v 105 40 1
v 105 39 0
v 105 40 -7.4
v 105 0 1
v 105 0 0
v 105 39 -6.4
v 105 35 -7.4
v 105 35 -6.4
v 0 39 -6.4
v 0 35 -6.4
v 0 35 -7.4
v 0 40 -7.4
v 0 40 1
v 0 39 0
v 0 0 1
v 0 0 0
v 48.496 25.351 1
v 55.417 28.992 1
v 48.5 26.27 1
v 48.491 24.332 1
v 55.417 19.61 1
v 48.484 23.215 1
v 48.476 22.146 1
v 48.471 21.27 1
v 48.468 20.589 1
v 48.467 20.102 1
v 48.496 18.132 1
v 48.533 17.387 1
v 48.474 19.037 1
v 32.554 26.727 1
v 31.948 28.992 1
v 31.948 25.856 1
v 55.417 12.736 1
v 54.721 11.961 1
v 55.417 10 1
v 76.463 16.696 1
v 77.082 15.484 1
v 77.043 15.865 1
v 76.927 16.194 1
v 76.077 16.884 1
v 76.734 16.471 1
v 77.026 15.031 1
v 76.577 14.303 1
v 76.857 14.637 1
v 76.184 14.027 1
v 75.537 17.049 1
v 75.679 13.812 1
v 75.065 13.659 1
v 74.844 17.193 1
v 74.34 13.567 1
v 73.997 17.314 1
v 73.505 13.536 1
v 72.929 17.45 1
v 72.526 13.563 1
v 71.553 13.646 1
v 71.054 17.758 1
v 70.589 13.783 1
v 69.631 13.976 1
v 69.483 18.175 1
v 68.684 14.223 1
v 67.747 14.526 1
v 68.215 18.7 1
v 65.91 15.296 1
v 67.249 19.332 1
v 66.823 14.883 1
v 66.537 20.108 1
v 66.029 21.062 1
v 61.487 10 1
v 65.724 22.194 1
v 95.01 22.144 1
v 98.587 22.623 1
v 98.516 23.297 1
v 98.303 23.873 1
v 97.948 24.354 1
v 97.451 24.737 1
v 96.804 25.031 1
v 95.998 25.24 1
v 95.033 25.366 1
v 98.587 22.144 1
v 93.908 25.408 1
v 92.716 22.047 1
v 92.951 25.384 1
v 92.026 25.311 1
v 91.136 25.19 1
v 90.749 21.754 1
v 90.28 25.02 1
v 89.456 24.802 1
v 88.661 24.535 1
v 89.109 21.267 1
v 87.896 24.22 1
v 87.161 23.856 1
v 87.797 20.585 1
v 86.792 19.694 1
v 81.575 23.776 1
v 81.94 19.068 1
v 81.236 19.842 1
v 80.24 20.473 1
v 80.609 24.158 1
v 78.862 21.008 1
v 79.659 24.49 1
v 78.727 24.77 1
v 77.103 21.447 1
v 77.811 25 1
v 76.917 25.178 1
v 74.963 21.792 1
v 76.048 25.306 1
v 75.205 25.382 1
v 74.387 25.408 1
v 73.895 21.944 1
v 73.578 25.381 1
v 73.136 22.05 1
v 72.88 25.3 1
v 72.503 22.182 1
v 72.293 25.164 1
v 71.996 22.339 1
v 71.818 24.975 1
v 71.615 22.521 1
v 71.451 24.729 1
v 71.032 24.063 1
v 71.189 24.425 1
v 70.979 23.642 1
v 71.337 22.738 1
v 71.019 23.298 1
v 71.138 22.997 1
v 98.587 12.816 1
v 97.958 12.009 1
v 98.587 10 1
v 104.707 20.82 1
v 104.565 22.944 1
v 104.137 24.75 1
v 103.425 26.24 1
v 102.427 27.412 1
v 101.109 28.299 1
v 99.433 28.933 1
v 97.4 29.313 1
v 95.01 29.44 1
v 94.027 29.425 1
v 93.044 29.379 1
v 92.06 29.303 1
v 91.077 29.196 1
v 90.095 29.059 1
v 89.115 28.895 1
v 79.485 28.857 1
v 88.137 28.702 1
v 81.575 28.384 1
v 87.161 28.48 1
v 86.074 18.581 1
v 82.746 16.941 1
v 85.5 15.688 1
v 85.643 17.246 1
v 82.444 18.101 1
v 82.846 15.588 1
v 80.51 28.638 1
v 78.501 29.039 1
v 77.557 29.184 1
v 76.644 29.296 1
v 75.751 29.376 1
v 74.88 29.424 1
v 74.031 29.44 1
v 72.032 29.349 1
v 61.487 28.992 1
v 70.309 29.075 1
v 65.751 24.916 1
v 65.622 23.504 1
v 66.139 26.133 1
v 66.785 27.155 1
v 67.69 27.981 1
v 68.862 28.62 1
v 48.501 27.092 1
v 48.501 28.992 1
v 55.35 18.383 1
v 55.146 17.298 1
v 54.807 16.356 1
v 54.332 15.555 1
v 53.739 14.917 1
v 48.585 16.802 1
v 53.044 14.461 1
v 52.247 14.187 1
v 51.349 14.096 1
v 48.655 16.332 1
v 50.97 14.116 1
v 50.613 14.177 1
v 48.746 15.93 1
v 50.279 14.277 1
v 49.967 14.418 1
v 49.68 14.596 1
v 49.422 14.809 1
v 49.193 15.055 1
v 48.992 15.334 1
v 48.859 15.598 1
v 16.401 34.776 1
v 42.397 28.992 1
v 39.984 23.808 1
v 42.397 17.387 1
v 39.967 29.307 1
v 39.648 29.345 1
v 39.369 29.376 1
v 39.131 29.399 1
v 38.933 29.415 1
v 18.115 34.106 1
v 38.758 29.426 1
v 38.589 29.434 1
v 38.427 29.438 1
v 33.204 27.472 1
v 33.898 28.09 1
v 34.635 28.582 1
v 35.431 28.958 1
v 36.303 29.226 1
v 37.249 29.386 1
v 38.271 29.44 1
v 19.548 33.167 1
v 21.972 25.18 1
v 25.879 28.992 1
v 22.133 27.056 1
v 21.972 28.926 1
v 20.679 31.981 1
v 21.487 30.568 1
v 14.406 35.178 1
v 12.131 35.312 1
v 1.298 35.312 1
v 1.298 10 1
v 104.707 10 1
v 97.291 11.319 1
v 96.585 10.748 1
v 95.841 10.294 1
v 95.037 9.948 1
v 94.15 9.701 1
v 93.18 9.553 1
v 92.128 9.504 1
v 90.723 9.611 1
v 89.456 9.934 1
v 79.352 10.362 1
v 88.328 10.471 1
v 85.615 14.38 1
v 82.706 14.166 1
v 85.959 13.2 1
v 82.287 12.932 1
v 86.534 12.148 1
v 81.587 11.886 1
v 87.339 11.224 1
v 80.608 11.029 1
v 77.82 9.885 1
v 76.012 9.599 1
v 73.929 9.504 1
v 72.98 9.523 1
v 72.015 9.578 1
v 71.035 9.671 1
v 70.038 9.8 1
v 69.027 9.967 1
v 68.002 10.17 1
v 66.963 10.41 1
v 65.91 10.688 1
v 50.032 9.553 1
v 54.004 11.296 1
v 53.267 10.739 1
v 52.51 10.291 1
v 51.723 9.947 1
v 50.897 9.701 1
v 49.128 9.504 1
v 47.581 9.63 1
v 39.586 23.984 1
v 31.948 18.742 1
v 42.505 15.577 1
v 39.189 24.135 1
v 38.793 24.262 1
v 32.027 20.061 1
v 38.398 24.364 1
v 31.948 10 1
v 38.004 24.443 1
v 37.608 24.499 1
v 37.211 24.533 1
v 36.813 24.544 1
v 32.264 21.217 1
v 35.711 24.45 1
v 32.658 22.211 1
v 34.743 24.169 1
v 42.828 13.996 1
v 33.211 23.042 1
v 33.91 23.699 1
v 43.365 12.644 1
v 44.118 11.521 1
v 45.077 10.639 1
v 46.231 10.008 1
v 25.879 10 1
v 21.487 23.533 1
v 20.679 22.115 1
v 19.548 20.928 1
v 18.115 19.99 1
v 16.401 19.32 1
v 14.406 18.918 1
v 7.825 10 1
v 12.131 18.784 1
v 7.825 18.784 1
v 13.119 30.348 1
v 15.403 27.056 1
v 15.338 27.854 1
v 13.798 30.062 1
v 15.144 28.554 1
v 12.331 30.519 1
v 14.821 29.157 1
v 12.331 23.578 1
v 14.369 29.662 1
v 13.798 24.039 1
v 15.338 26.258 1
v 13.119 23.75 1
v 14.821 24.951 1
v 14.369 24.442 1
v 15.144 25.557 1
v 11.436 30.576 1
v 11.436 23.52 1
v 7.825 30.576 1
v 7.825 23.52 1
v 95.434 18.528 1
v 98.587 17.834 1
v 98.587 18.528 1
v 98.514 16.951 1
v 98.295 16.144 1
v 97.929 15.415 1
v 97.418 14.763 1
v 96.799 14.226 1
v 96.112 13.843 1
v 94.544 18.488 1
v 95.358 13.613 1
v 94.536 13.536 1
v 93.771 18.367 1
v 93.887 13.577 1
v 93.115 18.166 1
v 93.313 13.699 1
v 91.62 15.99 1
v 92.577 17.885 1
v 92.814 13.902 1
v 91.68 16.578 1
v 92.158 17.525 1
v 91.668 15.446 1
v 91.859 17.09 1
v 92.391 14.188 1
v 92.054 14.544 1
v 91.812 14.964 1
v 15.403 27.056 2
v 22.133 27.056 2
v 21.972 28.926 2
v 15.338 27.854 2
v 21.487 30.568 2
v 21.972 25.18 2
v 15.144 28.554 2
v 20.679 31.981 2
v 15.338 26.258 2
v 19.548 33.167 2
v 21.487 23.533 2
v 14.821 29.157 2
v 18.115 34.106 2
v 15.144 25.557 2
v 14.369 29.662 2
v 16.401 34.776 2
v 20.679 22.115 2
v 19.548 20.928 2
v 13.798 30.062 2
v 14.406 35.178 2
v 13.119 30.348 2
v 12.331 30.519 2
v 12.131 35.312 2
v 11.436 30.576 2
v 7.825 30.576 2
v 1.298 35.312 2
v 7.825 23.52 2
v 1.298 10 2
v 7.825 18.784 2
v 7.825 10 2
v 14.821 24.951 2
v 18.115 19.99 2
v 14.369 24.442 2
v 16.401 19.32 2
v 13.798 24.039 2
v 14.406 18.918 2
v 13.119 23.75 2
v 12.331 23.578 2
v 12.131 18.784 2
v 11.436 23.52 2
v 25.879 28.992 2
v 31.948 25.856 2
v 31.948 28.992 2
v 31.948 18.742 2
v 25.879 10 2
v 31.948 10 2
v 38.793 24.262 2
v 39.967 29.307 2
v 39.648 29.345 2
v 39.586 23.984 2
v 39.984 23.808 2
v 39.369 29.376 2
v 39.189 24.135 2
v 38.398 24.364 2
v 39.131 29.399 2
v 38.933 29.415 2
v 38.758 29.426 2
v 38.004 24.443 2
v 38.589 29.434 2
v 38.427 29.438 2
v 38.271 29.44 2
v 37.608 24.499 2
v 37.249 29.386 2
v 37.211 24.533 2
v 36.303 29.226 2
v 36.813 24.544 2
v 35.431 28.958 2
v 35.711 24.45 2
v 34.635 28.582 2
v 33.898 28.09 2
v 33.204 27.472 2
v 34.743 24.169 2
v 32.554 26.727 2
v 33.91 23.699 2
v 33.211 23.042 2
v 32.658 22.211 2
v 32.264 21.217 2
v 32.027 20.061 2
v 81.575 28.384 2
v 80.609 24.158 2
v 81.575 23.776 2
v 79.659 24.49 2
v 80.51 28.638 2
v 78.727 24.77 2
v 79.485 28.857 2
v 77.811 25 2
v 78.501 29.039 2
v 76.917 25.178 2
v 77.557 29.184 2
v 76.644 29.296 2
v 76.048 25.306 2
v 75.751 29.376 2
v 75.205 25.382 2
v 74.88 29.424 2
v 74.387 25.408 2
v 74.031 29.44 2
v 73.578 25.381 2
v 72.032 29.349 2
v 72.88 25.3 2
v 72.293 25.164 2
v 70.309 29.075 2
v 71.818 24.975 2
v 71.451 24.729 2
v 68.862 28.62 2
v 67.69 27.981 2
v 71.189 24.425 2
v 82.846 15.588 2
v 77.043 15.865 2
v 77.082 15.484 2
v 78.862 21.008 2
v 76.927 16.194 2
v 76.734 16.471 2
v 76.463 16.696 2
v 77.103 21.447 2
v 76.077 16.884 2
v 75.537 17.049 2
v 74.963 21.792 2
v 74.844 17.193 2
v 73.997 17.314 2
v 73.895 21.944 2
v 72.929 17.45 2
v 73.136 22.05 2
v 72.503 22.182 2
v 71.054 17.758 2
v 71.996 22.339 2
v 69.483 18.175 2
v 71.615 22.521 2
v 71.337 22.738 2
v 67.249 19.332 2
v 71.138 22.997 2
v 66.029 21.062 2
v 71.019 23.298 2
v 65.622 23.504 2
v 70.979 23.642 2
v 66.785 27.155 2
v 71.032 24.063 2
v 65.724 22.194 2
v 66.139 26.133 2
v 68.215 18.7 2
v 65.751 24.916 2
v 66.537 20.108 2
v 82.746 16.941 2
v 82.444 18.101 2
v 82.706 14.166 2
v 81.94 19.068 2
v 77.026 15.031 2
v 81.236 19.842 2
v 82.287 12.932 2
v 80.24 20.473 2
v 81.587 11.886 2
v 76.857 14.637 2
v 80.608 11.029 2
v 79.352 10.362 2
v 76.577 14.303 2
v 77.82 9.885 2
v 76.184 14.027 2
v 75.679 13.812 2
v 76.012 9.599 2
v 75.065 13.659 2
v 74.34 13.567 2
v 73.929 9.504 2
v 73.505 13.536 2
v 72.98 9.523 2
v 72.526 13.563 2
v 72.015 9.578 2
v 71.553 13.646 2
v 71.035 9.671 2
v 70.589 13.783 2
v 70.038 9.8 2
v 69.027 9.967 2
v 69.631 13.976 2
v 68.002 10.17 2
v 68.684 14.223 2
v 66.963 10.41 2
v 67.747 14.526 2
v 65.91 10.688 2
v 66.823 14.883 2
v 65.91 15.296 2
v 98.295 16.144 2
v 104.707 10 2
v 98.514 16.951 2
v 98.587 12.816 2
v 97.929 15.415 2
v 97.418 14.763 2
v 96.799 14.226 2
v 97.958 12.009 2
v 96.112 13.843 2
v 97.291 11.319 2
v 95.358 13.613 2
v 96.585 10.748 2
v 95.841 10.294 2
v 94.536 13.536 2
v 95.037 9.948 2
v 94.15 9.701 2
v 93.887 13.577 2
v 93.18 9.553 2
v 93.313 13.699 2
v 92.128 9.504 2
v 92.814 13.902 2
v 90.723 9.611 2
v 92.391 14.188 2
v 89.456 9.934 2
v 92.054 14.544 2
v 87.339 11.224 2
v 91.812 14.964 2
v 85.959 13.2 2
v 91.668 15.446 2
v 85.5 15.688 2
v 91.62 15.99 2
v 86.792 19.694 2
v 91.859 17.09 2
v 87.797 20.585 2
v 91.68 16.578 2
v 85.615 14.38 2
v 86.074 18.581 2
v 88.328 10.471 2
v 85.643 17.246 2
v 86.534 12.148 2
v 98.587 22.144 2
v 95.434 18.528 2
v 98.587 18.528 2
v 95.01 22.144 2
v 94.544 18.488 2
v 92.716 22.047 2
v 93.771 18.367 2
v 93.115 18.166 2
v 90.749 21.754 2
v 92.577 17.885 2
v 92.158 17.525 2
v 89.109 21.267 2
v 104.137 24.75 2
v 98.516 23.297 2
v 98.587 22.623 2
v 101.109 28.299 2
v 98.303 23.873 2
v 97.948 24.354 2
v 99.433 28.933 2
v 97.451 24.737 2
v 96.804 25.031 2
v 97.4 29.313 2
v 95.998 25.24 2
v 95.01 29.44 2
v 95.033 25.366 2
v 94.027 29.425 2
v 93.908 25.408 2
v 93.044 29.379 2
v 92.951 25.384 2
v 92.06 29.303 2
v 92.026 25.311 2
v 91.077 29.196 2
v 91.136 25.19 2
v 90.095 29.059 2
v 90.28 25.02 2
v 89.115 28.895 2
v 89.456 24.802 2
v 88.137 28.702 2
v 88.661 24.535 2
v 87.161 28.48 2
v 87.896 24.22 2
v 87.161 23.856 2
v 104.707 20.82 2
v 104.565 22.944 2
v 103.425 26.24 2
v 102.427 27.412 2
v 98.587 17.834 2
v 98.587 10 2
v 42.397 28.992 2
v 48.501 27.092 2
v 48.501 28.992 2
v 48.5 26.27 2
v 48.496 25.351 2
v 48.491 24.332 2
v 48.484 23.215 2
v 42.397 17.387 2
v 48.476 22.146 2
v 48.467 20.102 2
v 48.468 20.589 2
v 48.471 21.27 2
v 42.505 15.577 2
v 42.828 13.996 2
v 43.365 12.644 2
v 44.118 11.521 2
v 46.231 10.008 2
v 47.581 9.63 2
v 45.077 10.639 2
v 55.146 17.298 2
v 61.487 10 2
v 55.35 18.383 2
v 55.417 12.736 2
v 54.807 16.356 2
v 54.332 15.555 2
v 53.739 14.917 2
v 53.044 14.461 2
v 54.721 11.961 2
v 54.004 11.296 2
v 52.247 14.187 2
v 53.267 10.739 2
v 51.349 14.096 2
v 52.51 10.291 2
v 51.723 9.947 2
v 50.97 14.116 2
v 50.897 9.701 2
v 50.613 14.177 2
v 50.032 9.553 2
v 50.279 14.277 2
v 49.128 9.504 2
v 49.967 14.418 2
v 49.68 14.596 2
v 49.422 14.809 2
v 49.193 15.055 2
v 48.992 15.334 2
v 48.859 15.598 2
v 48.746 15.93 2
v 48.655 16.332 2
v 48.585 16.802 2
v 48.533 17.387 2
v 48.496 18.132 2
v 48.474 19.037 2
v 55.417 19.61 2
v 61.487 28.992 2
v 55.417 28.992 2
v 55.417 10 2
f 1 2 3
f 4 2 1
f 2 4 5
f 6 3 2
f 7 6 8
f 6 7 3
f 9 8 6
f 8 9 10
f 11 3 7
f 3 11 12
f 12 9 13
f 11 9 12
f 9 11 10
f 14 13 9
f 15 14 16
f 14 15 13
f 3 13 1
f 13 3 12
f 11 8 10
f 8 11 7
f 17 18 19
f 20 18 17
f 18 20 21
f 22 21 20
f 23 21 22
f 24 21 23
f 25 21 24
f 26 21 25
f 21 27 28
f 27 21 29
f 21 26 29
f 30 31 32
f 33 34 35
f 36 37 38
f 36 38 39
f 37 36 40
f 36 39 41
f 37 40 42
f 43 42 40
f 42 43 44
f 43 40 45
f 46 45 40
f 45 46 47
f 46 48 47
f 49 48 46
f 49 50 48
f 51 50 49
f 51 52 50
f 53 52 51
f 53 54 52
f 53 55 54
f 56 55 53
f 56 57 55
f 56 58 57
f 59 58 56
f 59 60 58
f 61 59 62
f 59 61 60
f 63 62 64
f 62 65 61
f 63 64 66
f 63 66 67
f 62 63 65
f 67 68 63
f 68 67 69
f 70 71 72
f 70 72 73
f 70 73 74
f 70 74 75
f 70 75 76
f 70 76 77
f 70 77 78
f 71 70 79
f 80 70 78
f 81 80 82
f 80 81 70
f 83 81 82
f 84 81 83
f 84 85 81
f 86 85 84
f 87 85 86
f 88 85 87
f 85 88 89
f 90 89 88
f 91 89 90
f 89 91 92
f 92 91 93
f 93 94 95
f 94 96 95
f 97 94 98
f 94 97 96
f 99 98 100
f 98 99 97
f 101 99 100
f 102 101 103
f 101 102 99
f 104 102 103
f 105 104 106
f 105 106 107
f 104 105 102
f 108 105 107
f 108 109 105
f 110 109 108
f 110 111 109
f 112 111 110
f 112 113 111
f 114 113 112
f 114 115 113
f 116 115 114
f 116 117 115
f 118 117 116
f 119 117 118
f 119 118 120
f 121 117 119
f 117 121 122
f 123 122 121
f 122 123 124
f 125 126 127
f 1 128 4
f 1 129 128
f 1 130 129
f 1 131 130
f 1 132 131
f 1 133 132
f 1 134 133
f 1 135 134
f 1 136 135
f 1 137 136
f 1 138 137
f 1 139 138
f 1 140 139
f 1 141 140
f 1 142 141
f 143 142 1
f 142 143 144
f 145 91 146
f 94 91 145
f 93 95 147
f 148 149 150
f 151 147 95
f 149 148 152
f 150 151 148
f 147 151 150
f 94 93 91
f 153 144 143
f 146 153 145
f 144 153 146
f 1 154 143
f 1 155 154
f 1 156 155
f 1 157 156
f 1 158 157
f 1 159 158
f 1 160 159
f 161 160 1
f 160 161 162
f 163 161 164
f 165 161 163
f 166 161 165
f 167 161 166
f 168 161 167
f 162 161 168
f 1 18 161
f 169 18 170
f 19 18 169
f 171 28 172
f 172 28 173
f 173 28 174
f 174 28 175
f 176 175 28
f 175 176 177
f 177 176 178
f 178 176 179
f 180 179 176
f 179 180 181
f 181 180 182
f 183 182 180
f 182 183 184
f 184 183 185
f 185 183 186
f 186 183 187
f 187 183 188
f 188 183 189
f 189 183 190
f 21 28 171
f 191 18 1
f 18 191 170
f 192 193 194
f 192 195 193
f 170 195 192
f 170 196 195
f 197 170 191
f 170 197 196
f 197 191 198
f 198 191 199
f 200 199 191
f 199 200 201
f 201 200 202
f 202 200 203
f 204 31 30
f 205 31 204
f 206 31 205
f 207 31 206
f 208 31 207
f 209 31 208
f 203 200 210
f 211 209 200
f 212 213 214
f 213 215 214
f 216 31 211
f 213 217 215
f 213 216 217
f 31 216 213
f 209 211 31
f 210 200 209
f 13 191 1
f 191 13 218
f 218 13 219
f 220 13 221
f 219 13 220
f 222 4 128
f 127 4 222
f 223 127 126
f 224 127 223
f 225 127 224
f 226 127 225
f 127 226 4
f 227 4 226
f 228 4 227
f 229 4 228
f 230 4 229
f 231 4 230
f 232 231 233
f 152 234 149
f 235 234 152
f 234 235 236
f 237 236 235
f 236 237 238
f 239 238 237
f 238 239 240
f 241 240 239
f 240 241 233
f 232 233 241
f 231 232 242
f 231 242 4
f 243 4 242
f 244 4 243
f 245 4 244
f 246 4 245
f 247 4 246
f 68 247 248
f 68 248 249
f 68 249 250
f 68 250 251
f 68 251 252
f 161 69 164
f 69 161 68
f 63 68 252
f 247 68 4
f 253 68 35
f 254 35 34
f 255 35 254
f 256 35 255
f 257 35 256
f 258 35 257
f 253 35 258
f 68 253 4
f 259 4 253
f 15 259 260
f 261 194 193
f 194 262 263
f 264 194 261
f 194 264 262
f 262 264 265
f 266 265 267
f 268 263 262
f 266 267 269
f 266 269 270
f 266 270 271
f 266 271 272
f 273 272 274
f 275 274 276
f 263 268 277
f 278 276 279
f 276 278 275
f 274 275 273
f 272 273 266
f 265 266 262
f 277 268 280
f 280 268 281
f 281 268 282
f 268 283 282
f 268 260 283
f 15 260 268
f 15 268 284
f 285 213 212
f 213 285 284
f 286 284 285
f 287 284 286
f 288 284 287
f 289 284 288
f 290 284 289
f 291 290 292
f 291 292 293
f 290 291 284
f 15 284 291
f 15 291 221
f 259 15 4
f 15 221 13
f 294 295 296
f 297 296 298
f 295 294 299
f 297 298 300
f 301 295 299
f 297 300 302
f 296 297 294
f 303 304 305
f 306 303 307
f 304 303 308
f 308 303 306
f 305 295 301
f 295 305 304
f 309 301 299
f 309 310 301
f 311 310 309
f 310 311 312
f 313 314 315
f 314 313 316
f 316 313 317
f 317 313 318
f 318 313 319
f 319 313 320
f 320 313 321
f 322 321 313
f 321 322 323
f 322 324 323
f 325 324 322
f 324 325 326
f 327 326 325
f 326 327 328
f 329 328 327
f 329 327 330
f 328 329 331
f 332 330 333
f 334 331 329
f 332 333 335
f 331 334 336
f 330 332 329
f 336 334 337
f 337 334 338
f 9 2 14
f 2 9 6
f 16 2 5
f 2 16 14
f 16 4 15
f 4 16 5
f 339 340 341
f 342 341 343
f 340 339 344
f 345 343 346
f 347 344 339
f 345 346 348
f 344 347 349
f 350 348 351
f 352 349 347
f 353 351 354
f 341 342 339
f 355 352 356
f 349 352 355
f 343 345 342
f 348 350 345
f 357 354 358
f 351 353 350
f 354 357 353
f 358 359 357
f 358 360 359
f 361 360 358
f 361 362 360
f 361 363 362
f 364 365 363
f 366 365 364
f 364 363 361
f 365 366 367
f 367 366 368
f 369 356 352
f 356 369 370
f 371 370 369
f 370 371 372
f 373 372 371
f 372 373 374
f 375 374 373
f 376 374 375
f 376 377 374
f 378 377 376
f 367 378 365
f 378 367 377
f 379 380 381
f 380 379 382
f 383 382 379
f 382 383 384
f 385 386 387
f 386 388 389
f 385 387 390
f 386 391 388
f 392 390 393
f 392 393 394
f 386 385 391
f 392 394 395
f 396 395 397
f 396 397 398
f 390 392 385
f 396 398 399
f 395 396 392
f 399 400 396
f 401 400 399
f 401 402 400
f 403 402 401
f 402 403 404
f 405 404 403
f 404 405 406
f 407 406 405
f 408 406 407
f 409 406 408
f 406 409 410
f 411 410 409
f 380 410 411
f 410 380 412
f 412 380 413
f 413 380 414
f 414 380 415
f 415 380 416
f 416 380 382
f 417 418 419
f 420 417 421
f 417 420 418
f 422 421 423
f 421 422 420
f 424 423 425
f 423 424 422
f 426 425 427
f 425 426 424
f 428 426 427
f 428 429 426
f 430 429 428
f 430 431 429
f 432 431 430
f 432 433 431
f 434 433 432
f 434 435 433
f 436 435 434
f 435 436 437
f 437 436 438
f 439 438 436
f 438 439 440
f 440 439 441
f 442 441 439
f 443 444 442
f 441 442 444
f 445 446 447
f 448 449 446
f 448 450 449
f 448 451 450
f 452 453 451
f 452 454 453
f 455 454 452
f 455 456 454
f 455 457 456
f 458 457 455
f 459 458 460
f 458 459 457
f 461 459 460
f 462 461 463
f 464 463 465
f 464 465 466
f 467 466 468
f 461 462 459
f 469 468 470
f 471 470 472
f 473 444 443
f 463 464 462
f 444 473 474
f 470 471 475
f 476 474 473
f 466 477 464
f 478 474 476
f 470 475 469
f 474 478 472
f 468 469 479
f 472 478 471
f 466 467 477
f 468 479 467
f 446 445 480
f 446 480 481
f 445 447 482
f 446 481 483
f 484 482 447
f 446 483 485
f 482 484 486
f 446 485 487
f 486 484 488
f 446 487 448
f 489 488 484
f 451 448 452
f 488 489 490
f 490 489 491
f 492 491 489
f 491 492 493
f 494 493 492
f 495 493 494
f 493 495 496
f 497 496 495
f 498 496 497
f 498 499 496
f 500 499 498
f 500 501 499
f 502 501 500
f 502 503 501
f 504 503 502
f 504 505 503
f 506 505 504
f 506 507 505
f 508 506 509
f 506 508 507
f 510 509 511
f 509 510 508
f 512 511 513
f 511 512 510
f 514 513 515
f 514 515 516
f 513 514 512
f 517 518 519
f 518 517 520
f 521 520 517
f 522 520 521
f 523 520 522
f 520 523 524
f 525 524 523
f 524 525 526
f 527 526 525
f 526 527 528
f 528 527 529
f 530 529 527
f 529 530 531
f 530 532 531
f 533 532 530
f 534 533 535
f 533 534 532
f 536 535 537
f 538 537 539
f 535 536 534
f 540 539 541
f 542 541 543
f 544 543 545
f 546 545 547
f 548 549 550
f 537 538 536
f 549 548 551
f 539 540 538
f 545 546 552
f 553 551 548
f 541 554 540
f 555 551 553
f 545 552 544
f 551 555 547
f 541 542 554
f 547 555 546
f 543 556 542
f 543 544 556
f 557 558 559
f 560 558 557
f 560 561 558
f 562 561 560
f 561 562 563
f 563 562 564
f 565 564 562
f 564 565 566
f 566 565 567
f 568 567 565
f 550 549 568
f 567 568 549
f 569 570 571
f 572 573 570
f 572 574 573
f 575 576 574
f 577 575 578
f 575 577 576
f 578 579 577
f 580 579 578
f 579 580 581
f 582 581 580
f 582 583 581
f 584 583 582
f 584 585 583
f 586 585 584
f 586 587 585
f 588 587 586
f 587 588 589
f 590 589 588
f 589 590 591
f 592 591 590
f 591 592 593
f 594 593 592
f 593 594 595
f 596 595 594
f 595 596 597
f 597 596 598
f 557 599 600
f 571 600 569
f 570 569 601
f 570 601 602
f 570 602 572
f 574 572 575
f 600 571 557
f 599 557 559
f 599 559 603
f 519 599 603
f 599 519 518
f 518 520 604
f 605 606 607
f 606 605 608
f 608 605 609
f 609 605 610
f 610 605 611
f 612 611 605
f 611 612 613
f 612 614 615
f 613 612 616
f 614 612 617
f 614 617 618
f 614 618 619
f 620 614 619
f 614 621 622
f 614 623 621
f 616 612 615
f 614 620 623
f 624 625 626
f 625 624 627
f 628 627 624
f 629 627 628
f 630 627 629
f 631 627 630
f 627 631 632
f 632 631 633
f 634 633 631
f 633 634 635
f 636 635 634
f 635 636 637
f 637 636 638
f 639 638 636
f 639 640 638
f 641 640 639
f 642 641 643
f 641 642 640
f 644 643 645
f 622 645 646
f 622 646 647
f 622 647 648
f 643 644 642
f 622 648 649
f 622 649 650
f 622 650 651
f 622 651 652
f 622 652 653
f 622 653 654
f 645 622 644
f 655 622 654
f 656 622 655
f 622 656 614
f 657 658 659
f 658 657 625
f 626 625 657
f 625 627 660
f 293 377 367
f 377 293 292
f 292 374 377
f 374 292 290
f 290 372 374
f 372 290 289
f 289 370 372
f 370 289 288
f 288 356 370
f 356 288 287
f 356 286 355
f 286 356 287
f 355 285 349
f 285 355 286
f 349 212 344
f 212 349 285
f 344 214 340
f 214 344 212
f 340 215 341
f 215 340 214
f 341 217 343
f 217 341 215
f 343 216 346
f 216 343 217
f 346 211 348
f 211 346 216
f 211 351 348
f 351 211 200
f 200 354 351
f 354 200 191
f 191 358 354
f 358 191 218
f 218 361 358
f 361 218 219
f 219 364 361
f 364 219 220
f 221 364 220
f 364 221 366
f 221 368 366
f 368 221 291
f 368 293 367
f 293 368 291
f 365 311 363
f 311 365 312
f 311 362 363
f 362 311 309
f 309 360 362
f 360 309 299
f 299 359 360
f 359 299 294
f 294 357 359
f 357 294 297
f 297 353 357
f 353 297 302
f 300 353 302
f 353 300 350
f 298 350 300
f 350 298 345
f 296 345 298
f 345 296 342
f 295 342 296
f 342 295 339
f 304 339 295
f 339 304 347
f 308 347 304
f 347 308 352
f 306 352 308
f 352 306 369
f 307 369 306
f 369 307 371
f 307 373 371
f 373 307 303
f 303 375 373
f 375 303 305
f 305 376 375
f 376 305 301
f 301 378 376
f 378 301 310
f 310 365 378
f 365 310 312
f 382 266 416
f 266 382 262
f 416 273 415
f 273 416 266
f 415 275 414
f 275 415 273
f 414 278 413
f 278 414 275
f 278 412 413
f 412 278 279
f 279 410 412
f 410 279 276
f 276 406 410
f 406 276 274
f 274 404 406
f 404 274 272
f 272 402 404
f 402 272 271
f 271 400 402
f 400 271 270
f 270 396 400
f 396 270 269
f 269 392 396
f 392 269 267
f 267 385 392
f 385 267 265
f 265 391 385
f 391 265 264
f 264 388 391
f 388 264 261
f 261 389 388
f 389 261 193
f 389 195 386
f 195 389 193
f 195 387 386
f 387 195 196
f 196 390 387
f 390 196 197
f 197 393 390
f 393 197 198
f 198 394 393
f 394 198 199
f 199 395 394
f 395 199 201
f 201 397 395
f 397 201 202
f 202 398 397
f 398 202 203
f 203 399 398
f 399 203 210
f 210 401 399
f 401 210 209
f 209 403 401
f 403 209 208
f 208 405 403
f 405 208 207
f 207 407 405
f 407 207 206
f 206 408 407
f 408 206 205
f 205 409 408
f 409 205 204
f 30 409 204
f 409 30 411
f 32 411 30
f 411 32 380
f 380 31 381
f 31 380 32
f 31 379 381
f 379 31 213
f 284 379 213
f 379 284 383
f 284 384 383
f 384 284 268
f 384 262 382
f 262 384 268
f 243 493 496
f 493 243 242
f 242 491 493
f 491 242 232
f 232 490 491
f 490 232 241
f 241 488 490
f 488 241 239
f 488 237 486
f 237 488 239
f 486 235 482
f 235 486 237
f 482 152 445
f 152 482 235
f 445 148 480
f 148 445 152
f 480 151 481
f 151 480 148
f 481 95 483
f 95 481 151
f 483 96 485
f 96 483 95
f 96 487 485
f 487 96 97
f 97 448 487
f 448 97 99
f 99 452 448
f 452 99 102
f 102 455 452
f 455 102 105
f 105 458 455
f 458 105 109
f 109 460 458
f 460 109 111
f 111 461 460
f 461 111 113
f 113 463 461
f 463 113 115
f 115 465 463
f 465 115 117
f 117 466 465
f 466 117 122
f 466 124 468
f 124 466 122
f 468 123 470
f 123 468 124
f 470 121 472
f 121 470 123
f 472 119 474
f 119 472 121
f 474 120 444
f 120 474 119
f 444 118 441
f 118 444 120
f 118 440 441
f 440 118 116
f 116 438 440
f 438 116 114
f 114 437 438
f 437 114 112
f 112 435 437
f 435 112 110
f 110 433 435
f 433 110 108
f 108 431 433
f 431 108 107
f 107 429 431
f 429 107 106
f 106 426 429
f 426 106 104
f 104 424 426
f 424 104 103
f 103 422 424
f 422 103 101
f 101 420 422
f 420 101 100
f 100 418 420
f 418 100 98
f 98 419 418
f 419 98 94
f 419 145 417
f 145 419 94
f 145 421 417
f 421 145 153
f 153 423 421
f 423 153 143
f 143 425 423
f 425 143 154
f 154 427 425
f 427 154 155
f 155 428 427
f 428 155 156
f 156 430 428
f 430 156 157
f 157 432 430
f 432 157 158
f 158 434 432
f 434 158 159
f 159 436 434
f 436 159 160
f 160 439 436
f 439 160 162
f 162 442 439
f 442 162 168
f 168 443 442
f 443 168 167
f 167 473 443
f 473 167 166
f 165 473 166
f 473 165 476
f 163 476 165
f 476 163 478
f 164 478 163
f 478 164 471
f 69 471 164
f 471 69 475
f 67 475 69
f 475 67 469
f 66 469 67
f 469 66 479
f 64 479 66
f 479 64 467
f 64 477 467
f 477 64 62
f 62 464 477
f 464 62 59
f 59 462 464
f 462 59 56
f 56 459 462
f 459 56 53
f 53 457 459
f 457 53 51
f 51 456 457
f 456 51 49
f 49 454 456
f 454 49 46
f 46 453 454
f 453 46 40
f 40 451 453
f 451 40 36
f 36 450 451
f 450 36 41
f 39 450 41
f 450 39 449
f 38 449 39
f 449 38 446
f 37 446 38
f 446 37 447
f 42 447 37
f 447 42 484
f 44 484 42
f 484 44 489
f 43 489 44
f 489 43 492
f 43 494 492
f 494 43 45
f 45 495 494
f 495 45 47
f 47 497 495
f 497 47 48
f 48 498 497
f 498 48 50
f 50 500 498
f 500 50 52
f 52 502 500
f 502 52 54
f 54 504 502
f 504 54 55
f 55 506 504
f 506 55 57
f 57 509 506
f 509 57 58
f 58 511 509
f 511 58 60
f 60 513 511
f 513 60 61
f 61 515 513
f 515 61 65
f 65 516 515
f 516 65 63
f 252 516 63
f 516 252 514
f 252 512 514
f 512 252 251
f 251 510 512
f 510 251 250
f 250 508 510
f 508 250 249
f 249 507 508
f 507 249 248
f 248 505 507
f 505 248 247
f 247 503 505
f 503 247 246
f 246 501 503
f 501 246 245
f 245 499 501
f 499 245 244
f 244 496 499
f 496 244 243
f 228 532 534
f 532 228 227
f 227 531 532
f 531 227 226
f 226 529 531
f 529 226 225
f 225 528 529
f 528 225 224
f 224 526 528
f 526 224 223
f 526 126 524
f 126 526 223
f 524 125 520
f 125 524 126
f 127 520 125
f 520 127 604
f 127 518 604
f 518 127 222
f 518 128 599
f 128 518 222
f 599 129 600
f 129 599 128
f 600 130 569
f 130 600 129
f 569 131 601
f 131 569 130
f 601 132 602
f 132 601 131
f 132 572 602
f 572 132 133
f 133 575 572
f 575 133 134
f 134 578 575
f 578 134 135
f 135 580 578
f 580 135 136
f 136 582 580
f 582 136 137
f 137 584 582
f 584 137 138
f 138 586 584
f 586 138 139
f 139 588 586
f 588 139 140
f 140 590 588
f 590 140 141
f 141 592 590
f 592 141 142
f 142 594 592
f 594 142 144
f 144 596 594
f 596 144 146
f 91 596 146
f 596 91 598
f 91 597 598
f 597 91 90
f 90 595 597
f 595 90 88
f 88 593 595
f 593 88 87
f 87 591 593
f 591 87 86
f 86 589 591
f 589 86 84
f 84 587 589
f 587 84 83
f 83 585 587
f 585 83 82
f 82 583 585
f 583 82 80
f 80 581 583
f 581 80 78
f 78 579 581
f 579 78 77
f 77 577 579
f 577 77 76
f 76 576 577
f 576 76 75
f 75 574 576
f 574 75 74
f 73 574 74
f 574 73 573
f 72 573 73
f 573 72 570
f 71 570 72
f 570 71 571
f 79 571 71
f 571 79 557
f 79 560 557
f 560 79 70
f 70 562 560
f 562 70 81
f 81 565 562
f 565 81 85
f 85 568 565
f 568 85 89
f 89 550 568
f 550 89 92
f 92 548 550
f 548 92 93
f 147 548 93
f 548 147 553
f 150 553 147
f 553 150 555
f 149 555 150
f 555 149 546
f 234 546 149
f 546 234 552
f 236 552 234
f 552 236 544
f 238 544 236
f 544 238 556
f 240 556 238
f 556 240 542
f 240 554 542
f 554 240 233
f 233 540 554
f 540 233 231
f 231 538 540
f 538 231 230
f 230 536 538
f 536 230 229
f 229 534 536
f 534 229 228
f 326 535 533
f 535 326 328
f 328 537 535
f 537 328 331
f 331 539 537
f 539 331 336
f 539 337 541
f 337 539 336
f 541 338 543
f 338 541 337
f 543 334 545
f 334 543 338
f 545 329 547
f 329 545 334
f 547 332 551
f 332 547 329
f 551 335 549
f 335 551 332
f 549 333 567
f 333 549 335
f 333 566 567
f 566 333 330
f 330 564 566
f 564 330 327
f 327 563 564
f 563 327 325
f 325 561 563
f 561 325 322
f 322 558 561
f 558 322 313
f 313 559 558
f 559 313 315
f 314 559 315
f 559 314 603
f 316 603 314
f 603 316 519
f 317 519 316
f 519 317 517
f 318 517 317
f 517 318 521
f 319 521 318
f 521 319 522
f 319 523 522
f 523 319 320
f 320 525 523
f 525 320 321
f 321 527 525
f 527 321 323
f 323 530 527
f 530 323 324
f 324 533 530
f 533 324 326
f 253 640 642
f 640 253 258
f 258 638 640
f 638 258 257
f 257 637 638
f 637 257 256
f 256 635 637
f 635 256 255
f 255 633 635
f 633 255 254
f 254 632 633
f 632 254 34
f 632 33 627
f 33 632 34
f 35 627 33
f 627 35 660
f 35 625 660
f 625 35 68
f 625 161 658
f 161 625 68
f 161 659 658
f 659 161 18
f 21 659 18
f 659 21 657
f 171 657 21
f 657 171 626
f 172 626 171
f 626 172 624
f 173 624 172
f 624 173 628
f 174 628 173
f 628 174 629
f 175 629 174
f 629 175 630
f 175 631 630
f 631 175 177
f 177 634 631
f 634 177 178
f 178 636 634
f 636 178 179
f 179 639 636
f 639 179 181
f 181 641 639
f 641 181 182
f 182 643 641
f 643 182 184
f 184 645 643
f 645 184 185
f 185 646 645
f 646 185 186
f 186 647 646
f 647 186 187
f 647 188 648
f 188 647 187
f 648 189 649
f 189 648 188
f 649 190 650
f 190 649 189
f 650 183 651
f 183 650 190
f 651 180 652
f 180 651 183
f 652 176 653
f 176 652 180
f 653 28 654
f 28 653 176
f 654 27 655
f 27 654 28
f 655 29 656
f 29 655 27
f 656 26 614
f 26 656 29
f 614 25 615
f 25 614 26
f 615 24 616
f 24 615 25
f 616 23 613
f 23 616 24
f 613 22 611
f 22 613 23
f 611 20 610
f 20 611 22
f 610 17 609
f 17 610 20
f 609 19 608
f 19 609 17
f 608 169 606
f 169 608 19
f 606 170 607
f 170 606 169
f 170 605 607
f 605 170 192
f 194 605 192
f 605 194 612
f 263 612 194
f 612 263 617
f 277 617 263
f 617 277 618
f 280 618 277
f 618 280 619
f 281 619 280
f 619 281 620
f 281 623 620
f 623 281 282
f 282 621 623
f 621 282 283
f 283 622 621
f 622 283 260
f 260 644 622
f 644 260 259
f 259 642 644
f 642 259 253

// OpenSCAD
label = "Prusa";
length_scale_factor = 100; // adjust for more or less cushion on the sides

// Prusa top frame rail => 6.35 thick, 40.11 tall
// Note: The export model should be thin so it does not interfere with the extruder operation

union() {
    scale = length_scale_factor / 100;
    
    frame_thickness = 6.4;
    plate_thickness = 1;
    back_height = 5;
    w = 21 * len(label) * scale;
    h = 40;
    
    if (w>150) echo(str("<span style='background-color: #f33'> WARNING: Width of ",w,"mm may interfere with Prusa spool holder</span>"));
    
    Plate_Back(w, h, plate_thickness, frame_thickness, back_height);
    Plate_Top(w, h, plate_thickness, frame_thickness);
    Plate_Front(w, h, plate_thickness);
    Label(w, h, plate_thickness);
}

module Plate_Back(w, h, plate_thickness, frame_thickness, back_height) {
    translate([0, h-back_height, -frame_thickness-plate_thickness])
    color("blue")
    cube([w, back_height, plate_thickness]);
}

module Plate_Top(w, h, plate_thickness, frame_thickness) {
    translate([0, h-plate_thickness, -frame_thickness-plate_thickness]) 
    color("green") 
    cube([w, plate_thickness, frame_thickness + (plate_thickness*2)]);
}

module Plate_Front(w, h, plate_thickness) {
    color("red") 
    cube([w, h, plate_thickness]);
}
module Label(w, h, plate_thickness) {
    translate([w/2, h * 0.25, plate_thickness]) 
    color("orange") 
    linear_extrude(height=plate_thickness) 
    text(label, font="Archivo Black:style=Bold", halign="center", size=h * 5/8);
}
